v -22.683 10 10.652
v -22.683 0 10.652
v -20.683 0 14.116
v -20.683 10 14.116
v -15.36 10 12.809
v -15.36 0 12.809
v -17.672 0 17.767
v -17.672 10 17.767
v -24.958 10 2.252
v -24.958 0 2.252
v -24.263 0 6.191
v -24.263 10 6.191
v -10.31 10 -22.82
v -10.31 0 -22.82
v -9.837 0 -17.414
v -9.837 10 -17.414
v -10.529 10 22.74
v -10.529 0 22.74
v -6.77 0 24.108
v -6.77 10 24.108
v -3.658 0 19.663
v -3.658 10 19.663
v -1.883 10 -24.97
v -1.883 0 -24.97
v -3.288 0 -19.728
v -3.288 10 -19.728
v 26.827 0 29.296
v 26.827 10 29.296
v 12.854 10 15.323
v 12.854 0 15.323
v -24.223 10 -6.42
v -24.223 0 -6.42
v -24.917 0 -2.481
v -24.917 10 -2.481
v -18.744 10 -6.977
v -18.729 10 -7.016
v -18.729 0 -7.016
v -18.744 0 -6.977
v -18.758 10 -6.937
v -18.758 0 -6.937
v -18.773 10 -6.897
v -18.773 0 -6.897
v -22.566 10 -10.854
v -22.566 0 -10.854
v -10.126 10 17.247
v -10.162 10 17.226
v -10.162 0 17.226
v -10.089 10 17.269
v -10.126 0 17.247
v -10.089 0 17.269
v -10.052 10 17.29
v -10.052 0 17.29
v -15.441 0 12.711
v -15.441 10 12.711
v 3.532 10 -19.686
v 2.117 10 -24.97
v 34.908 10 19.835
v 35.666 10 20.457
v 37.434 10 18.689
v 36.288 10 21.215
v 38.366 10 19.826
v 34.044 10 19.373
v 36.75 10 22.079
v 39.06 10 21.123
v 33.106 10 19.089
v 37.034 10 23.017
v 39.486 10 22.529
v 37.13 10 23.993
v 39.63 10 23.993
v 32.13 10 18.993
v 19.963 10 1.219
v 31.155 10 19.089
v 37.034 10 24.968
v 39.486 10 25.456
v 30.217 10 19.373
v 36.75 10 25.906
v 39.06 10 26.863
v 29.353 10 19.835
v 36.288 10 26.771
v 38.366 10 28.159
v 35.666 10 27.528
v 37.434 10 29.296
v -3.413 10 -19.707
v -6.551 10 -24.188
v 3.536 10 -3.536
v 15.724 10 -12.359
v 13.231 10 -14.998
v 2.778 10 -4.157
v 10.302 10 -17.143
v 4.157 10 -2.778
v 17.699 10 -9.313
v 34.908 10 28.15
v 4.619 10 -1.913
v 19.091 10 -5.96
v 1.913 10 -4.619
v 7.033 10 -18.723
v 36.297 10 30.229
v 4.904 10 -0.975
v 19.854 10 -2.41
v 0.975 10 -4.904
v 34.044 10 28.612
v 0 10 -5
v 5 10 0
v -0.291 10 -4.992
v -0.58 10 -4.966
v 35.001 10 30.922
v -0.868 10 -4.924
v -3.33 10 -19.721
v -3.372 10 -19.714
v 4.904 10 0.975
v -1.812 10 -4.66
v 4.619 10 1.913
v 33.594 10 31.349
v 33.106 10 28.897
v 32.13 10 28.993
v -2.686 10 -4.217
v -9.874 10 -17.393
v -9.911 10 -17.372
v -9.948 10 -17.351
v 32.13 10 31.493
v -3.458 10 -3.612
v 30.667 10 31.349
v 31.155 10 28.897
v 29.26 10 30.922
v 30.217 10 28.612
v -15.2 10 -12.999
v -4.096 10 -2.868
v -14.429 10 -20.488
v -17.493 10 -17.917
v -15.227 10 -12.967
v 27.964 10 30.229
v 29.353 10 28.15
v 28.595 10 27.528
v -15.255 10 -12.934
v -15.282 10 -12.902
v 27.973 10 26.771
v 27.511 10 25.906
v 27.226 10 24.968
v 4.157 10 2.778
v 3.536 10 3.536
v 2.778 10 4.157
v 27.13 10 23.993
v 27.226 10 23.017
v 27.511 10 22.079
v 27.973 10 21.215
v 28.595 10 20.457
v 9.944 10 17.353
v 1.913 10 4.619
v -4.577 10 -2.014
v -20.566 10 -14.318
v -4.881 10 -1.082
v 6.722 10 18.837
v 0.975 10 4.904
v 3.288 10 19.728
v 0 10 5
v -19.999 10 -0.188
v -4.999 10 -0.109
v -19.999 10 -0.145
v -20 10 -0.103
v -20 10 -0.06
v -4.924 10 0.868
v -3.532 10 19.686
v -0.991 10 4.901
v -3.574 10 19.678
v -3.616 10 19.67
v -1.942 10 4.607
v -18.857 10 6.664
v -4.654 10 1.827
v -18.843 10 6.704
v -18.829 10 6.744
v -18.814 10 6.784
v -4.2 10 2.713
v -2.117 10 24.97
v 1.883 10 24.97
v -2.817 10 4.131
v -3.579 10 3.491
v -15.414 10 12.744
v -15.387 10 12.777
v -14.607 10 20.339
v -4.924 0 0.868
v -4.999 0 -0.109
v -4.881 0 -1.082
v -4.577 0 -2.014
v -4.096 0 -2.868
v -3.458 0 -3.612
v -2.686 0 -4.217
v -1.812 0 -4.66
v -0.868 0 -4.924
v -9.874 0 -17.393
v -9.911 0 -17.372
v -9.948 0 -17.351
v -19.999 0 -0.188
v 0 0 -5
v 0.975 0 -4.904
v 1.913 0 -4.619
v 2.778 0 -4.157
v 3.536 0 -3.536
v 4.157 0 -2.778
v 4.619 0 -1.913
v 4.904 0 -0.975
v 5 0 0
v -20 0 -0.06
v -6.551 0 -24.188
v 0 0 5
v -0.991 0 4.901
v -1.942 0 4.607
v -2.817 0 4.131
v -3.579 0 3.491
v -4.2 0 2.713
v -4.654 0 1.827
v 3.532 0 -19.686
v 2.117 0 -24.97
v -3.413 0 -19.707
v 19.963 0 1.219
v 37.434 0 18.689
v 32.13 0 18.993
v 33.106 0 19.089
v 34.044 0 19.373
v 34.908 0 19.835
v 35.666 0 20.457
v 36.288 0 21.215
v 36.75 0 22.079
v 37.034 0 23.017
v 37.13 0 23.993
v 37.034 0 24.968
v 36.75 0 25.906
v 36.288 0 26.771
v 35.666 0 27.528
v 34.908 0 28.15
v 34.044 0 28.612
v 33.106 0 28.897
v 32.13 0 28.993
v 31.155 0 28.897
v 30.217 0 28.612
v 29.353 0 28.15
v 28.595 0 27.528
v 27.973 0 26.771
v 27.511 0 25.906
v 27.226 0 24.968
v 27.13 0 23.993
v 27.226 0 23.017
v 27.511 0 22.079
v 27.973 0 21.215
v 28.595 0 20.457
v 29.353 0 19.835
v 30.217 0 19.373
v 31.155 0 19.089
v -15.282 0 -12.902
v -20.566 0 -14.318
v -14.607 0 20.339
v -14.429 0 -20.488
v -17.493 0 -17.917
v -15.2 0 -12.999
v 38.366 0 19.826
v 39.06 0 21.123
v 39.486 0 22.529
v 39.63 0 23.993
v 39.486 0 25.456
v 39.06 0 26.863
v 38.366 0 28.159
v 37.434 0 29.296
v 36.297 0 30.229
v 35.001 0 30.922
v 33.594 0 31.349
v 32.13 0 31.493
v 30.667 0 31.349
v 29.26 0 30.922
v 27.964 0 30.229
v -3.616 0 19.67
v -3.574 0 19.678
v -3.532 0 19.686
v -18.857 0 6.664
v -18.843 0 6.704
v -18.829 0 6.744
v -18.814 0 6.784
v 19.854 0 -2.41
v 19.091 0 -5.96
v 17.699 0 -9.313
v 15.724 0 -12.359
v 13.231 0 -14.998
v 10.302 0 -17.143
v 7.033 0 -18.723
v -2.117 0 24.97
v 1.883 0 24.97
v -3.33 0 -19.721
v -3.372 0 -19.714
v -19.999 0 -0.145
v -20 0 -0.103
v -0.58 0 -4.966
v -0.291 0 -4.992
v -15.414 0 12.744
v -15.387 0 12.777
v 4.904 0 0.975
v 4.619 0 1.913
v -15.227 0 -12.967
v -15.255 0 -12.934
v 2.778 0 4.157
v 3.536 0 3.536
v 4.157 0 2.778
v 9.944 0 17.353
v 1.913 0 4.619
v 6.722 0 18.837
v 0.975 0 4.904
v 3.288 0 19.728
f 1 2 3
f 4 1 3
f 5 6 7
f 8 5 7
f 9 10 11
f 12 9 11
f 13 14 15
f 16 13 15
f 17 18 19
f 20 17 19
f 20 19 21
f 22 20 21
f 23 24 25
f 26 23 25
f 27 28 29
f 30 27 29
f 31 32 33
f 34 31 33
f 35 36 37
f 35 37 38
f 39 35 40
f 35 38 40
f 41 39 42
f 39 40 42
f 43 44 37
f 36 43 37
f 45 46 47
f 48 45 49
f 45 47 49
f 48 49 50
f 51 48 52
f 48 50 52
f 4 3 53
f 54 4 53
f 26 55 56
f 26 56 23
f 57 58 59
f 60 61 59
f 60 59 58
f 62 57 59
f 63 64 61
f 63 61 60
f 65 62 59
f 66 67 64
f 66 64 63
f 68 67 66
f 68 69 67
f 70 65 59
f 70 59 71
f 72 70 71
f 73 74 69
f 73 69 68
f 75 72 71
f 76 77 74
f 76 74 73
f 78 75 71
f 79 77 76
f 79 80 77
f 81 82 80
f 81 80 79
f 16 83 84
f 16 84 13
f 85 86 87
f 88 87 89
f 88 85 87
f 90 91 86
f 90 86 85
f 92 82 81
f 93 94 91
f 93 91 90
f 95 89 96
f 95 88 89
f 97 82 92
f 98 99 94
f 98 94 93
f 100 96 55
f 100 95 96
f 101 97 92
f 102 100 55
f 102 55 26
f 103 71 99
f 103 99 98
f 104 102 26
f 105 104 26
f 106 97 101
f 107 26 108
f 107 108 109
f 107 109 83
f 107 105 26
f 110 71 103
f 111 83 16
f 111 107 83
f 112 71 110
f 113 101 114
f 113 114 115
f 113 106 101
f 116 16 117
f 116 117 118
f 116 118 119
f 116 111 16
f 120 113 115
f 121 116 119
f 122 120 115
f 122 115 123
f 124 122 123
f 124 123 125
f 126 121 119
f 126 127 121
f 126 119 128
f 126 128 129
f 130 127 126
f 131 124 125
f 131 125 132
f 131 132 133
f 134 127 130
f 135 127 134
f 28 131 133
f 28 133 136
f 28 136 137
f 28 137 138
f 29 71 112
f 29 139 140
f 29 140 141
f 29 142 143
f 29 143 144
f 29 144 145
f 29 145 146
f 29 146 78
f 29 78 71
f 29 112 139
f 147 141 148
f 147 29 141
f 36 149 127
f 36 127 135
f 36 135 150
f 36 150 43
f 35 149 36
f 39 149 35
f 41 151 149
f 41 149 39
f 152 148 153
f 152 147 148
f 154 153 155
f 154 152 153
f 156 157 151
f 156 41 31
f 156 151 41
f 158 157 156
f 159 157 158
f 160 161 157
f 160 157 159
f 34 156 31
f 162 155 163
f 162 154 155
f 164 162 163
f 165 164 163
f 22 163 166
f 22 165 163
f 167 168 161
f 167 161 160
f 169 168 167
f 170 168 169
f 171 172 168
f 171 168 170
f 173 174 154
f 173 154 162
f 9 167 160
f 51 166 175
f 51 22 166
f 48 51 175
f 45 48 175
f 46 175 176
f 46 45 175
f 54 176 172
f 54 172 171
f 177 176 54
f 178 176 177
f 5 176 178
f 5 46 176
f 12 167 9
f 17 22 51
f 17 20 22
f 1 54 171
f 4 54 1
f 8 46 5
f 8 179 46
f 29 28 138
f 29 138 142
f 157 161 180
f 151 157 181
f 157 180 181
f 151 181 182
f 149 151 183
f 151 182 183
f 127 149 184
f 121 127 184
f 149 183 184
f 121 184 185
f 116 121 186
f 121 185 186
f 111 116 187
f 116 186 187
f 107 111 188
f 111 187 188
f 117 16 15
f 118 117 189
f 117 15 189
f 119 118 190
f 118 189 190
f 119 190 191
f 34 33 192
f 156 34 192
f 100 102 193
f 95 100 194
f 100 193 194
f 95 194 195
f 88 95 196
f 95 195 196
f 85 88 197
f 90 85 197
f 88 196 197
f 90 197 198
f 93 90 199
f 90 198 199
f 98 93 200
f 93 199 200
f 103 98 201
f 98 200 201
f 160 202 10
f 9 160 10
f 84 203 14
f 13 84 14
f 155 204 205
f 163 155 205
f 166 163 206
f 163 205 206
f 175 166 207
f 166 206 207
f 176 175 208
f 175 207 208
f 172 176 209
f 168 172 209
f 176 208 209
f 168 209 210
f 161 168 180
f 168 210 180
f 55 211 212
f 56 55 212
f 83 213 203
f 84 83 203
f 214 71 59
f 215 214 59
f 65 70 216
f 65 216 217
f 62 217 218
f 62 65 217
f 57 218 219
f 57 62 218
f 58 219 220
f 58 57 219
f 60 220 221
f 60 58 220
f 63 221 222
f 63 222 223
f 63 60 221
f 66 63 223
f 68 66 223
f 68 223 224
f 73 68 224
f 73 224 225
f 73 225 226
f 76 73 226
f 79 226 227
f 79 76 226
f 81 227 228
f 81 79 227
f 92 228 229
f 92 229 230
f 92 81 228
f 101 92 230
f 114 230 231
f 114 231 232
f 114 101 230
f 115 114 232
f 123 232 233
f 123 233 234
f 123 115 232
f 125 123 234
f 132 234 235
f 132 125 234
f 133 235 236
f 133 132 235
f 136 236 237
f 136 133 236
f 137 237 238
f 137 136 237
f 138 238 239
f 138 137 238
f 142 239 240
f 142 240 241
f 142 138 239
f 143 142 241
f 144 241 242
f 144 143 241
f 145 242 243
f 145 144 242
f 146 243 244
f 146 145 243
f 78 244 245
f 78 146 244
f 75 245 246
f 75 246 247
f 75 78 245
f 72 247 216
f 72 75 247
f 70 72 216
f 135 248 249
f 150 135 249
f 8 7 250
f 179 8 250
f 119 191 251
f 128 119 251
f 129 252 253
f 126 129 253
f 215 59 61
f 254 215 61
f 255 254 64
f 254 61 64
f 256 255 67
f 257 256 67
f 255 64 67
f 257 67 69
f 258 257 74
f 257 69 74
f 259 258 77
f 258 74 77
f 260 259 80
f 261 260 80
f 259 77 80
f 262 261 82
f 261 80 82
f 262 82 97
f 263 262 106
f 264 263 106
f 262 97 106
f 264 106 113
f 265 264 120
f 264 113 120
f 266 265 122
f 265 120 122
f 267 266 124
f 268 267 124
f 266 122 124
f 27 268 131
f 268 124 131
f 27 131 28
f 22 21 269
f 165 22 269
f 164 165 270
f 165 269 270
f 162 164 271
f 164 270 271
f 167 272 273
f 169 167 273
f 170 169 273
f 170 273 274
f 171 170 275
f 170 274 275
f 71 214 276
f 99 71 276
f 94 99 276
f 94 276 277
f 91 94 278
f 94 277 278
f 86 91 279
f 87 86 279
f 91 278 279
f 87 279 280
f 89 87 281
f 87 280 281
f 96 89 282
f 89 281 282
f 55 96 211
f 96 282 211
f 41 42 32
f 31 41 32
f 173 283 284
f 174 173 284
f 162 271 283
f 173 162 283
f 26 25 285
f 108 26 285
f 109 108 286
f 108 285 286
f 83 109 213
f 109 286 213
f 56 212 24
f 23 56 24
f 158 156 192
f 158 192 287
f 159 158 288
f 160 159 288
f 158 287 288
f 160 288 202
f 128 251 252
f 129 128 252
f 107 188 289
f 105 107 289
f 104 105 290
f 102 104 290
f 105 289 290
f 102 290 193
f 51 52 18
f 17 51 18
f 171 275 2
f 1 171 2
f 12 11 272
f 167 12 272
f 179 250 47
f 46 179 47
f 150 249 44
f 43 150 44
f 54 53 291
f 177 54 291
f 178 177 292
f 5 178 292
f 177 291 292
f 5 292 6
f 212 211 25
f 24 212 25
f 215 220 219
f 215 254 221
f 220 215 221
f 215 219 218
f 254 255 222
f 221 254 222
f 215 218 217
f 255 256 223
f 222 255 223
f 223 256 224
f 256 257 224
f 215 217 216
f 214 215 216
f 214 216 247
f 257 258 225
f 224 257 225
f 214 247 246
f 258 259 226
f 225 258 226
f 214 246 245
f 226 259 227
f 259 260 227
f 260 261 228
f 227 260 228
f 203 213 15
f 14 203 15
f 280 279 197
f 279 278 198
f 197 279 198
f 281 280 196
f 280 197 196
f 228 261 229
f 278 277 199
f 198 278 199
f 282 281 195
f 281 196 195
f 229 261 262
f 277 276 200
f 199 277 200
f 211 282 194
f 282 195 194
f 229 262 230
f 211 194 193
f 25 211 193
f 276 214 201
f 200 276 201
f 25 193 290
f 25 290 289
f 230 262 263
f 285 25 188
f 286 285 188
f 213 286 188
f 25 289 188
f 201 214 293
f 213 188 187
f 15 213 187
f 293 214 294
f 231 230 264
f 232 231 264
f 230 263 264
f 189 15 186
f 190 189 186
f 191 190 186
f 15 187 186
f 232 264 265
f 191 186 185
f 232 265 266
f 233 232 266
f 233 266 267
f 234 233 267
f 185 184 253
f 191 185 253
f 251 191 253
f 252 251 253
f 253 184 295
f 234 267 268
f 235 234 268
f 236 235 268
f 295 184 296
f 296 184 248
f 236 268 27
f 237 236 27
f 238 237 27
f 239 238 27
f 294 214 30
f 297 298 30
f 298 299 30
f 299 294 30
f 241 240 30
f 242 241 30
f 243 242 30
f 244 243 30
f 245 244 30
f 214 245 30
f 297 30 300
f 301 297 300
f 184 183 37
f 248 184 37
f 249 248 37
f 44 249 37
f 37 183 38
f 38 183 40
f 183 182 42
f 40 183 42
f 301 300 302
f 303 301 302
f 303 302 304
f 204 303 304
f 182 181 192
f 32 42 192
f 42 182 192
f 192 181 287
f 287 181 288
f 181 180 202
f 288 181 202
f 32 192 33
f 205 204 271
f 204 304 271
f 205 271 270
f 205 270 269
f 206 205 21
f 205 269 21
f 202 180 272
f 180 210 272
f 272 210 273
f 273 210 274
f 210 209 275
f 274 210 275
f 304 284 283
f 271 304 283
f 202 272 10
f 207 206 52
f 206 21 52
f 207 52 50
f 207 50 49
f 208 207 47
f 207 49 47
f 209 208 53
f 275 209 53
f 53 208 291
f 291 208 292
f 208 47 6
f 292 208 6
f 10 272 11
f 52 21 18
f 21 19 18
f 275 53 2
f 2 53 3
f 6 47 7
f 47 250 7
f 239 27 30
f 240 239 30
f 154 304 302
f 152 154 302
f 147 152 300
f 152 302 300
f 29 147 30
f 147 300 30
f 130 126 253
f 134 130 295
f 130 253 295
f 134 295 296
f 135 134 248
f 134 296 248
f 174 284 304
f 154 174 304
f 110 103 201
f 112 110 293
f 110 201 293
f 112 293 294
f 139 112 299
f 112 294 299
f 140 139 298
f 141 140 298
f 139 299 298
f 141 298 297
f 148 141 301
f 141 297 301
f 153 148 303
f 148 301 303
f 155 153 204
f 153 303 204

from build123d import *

# Parameters (mm, degrees)
SALIENTE_EXTRUIR1_DEPTH = 10
MATRIZC1_COUNT          = 10
MATRIZC1_ANGLE          = 180
SALIENTE_EXTRUIR5_START = -10
CROQUIS2_R              = 5
SALIENTE_EXTRUIR5_DEPTH = 10


with BuildPart() as part:
    # Croquis1 → Saliente-Extruir1 (new body)
    with BuildSketch(Plane(origin=(0, 0, 0), x_dir=(1, 0, 0), z_dir=(0, 1, 0))):
        with BuildLine():
            Line((0, 5), (0, 20))
            Line((0, 20), (0, 24.969733164))
            Line((0, 24.969733164), (-1.883440248, 24.969733164))
            Line((-1.883440248, 24.969733164), (-3.287991504, 19.727876517))
            ThreePointArc((-3.287991504, 19.727876517), (-19.931853029, -1.649616571), (0, -20))
            Line((0, -20), (0, -5))
            ThreePointArc((0, -5), (-5, 0), (0, 5))
        make_face()
        with BuildLine():
            Line((0, 24.969733164), (0, 20))
            Line((0, 20), (0, 5))
            ThreePointArc((0, 5), (3.535533906, 3.535533906), (5, 0))
            ThreePointArc((5, 0), (3.535533906, -3.535533906), (0, -5))
            Line((0, -5), (0, -20))
            ThreePointArc((0, -20), (19.921238429, -1.773205983), (3.532445918, 19.685574054))
            Line((3.532445918, 19.685574054), (2.116559752, 24.969733164))
            Line((2.116559752, 24.969733164), (0, 24.969733164))
        make_face()
    saliente_extruir1 = extrude(amount=SALIENTE_EXTRUIR1_DEPTH)

    # MatrizC1: Saliente-Extruir1 ×10 about axis
    matrizc1_axis = Axis((0, 0, 0), (0, 1, 0))
    for i in range(1, MATRIZC1_COUNT):
        add(saliente_extruir1.rotate(matrizc1_axis, i * MATRIZC1_ANGLE / (MATRIZC1_COUNT - 1)))

    # Croquis2 → Saliente-Extruir5 (add)
    with BuildSketch(Plane.XZ.offset(SALIENTE_EXTRUIR5_START)):
        with BuildLine():
            Line((26.827116941, 29.295976121), (12.853727975, 15.322587155))
            ThreePointArc((12.853727975, 15.322587155), (17.859540741, 9.002044462), (19.962846781, 1.218502525))
            Line((19.962846781, 1.218502525), (37.433718659, 18.689374403))
            ThreePointArc((37.433718659, 18.689374403), (37.433718659, 29.295976121), (26.827116941, 29.295976121))
        make_face()
        with Locations(Location((32.1304178, 23.992675262, 0), (0, 0, 270))):
            Circle(CROQUIS2_R, mode=Mode.SUBTRACT)
    extrude(amount=SALIENTE_EXTRUIR5_DEPTH)


solid = part.part
